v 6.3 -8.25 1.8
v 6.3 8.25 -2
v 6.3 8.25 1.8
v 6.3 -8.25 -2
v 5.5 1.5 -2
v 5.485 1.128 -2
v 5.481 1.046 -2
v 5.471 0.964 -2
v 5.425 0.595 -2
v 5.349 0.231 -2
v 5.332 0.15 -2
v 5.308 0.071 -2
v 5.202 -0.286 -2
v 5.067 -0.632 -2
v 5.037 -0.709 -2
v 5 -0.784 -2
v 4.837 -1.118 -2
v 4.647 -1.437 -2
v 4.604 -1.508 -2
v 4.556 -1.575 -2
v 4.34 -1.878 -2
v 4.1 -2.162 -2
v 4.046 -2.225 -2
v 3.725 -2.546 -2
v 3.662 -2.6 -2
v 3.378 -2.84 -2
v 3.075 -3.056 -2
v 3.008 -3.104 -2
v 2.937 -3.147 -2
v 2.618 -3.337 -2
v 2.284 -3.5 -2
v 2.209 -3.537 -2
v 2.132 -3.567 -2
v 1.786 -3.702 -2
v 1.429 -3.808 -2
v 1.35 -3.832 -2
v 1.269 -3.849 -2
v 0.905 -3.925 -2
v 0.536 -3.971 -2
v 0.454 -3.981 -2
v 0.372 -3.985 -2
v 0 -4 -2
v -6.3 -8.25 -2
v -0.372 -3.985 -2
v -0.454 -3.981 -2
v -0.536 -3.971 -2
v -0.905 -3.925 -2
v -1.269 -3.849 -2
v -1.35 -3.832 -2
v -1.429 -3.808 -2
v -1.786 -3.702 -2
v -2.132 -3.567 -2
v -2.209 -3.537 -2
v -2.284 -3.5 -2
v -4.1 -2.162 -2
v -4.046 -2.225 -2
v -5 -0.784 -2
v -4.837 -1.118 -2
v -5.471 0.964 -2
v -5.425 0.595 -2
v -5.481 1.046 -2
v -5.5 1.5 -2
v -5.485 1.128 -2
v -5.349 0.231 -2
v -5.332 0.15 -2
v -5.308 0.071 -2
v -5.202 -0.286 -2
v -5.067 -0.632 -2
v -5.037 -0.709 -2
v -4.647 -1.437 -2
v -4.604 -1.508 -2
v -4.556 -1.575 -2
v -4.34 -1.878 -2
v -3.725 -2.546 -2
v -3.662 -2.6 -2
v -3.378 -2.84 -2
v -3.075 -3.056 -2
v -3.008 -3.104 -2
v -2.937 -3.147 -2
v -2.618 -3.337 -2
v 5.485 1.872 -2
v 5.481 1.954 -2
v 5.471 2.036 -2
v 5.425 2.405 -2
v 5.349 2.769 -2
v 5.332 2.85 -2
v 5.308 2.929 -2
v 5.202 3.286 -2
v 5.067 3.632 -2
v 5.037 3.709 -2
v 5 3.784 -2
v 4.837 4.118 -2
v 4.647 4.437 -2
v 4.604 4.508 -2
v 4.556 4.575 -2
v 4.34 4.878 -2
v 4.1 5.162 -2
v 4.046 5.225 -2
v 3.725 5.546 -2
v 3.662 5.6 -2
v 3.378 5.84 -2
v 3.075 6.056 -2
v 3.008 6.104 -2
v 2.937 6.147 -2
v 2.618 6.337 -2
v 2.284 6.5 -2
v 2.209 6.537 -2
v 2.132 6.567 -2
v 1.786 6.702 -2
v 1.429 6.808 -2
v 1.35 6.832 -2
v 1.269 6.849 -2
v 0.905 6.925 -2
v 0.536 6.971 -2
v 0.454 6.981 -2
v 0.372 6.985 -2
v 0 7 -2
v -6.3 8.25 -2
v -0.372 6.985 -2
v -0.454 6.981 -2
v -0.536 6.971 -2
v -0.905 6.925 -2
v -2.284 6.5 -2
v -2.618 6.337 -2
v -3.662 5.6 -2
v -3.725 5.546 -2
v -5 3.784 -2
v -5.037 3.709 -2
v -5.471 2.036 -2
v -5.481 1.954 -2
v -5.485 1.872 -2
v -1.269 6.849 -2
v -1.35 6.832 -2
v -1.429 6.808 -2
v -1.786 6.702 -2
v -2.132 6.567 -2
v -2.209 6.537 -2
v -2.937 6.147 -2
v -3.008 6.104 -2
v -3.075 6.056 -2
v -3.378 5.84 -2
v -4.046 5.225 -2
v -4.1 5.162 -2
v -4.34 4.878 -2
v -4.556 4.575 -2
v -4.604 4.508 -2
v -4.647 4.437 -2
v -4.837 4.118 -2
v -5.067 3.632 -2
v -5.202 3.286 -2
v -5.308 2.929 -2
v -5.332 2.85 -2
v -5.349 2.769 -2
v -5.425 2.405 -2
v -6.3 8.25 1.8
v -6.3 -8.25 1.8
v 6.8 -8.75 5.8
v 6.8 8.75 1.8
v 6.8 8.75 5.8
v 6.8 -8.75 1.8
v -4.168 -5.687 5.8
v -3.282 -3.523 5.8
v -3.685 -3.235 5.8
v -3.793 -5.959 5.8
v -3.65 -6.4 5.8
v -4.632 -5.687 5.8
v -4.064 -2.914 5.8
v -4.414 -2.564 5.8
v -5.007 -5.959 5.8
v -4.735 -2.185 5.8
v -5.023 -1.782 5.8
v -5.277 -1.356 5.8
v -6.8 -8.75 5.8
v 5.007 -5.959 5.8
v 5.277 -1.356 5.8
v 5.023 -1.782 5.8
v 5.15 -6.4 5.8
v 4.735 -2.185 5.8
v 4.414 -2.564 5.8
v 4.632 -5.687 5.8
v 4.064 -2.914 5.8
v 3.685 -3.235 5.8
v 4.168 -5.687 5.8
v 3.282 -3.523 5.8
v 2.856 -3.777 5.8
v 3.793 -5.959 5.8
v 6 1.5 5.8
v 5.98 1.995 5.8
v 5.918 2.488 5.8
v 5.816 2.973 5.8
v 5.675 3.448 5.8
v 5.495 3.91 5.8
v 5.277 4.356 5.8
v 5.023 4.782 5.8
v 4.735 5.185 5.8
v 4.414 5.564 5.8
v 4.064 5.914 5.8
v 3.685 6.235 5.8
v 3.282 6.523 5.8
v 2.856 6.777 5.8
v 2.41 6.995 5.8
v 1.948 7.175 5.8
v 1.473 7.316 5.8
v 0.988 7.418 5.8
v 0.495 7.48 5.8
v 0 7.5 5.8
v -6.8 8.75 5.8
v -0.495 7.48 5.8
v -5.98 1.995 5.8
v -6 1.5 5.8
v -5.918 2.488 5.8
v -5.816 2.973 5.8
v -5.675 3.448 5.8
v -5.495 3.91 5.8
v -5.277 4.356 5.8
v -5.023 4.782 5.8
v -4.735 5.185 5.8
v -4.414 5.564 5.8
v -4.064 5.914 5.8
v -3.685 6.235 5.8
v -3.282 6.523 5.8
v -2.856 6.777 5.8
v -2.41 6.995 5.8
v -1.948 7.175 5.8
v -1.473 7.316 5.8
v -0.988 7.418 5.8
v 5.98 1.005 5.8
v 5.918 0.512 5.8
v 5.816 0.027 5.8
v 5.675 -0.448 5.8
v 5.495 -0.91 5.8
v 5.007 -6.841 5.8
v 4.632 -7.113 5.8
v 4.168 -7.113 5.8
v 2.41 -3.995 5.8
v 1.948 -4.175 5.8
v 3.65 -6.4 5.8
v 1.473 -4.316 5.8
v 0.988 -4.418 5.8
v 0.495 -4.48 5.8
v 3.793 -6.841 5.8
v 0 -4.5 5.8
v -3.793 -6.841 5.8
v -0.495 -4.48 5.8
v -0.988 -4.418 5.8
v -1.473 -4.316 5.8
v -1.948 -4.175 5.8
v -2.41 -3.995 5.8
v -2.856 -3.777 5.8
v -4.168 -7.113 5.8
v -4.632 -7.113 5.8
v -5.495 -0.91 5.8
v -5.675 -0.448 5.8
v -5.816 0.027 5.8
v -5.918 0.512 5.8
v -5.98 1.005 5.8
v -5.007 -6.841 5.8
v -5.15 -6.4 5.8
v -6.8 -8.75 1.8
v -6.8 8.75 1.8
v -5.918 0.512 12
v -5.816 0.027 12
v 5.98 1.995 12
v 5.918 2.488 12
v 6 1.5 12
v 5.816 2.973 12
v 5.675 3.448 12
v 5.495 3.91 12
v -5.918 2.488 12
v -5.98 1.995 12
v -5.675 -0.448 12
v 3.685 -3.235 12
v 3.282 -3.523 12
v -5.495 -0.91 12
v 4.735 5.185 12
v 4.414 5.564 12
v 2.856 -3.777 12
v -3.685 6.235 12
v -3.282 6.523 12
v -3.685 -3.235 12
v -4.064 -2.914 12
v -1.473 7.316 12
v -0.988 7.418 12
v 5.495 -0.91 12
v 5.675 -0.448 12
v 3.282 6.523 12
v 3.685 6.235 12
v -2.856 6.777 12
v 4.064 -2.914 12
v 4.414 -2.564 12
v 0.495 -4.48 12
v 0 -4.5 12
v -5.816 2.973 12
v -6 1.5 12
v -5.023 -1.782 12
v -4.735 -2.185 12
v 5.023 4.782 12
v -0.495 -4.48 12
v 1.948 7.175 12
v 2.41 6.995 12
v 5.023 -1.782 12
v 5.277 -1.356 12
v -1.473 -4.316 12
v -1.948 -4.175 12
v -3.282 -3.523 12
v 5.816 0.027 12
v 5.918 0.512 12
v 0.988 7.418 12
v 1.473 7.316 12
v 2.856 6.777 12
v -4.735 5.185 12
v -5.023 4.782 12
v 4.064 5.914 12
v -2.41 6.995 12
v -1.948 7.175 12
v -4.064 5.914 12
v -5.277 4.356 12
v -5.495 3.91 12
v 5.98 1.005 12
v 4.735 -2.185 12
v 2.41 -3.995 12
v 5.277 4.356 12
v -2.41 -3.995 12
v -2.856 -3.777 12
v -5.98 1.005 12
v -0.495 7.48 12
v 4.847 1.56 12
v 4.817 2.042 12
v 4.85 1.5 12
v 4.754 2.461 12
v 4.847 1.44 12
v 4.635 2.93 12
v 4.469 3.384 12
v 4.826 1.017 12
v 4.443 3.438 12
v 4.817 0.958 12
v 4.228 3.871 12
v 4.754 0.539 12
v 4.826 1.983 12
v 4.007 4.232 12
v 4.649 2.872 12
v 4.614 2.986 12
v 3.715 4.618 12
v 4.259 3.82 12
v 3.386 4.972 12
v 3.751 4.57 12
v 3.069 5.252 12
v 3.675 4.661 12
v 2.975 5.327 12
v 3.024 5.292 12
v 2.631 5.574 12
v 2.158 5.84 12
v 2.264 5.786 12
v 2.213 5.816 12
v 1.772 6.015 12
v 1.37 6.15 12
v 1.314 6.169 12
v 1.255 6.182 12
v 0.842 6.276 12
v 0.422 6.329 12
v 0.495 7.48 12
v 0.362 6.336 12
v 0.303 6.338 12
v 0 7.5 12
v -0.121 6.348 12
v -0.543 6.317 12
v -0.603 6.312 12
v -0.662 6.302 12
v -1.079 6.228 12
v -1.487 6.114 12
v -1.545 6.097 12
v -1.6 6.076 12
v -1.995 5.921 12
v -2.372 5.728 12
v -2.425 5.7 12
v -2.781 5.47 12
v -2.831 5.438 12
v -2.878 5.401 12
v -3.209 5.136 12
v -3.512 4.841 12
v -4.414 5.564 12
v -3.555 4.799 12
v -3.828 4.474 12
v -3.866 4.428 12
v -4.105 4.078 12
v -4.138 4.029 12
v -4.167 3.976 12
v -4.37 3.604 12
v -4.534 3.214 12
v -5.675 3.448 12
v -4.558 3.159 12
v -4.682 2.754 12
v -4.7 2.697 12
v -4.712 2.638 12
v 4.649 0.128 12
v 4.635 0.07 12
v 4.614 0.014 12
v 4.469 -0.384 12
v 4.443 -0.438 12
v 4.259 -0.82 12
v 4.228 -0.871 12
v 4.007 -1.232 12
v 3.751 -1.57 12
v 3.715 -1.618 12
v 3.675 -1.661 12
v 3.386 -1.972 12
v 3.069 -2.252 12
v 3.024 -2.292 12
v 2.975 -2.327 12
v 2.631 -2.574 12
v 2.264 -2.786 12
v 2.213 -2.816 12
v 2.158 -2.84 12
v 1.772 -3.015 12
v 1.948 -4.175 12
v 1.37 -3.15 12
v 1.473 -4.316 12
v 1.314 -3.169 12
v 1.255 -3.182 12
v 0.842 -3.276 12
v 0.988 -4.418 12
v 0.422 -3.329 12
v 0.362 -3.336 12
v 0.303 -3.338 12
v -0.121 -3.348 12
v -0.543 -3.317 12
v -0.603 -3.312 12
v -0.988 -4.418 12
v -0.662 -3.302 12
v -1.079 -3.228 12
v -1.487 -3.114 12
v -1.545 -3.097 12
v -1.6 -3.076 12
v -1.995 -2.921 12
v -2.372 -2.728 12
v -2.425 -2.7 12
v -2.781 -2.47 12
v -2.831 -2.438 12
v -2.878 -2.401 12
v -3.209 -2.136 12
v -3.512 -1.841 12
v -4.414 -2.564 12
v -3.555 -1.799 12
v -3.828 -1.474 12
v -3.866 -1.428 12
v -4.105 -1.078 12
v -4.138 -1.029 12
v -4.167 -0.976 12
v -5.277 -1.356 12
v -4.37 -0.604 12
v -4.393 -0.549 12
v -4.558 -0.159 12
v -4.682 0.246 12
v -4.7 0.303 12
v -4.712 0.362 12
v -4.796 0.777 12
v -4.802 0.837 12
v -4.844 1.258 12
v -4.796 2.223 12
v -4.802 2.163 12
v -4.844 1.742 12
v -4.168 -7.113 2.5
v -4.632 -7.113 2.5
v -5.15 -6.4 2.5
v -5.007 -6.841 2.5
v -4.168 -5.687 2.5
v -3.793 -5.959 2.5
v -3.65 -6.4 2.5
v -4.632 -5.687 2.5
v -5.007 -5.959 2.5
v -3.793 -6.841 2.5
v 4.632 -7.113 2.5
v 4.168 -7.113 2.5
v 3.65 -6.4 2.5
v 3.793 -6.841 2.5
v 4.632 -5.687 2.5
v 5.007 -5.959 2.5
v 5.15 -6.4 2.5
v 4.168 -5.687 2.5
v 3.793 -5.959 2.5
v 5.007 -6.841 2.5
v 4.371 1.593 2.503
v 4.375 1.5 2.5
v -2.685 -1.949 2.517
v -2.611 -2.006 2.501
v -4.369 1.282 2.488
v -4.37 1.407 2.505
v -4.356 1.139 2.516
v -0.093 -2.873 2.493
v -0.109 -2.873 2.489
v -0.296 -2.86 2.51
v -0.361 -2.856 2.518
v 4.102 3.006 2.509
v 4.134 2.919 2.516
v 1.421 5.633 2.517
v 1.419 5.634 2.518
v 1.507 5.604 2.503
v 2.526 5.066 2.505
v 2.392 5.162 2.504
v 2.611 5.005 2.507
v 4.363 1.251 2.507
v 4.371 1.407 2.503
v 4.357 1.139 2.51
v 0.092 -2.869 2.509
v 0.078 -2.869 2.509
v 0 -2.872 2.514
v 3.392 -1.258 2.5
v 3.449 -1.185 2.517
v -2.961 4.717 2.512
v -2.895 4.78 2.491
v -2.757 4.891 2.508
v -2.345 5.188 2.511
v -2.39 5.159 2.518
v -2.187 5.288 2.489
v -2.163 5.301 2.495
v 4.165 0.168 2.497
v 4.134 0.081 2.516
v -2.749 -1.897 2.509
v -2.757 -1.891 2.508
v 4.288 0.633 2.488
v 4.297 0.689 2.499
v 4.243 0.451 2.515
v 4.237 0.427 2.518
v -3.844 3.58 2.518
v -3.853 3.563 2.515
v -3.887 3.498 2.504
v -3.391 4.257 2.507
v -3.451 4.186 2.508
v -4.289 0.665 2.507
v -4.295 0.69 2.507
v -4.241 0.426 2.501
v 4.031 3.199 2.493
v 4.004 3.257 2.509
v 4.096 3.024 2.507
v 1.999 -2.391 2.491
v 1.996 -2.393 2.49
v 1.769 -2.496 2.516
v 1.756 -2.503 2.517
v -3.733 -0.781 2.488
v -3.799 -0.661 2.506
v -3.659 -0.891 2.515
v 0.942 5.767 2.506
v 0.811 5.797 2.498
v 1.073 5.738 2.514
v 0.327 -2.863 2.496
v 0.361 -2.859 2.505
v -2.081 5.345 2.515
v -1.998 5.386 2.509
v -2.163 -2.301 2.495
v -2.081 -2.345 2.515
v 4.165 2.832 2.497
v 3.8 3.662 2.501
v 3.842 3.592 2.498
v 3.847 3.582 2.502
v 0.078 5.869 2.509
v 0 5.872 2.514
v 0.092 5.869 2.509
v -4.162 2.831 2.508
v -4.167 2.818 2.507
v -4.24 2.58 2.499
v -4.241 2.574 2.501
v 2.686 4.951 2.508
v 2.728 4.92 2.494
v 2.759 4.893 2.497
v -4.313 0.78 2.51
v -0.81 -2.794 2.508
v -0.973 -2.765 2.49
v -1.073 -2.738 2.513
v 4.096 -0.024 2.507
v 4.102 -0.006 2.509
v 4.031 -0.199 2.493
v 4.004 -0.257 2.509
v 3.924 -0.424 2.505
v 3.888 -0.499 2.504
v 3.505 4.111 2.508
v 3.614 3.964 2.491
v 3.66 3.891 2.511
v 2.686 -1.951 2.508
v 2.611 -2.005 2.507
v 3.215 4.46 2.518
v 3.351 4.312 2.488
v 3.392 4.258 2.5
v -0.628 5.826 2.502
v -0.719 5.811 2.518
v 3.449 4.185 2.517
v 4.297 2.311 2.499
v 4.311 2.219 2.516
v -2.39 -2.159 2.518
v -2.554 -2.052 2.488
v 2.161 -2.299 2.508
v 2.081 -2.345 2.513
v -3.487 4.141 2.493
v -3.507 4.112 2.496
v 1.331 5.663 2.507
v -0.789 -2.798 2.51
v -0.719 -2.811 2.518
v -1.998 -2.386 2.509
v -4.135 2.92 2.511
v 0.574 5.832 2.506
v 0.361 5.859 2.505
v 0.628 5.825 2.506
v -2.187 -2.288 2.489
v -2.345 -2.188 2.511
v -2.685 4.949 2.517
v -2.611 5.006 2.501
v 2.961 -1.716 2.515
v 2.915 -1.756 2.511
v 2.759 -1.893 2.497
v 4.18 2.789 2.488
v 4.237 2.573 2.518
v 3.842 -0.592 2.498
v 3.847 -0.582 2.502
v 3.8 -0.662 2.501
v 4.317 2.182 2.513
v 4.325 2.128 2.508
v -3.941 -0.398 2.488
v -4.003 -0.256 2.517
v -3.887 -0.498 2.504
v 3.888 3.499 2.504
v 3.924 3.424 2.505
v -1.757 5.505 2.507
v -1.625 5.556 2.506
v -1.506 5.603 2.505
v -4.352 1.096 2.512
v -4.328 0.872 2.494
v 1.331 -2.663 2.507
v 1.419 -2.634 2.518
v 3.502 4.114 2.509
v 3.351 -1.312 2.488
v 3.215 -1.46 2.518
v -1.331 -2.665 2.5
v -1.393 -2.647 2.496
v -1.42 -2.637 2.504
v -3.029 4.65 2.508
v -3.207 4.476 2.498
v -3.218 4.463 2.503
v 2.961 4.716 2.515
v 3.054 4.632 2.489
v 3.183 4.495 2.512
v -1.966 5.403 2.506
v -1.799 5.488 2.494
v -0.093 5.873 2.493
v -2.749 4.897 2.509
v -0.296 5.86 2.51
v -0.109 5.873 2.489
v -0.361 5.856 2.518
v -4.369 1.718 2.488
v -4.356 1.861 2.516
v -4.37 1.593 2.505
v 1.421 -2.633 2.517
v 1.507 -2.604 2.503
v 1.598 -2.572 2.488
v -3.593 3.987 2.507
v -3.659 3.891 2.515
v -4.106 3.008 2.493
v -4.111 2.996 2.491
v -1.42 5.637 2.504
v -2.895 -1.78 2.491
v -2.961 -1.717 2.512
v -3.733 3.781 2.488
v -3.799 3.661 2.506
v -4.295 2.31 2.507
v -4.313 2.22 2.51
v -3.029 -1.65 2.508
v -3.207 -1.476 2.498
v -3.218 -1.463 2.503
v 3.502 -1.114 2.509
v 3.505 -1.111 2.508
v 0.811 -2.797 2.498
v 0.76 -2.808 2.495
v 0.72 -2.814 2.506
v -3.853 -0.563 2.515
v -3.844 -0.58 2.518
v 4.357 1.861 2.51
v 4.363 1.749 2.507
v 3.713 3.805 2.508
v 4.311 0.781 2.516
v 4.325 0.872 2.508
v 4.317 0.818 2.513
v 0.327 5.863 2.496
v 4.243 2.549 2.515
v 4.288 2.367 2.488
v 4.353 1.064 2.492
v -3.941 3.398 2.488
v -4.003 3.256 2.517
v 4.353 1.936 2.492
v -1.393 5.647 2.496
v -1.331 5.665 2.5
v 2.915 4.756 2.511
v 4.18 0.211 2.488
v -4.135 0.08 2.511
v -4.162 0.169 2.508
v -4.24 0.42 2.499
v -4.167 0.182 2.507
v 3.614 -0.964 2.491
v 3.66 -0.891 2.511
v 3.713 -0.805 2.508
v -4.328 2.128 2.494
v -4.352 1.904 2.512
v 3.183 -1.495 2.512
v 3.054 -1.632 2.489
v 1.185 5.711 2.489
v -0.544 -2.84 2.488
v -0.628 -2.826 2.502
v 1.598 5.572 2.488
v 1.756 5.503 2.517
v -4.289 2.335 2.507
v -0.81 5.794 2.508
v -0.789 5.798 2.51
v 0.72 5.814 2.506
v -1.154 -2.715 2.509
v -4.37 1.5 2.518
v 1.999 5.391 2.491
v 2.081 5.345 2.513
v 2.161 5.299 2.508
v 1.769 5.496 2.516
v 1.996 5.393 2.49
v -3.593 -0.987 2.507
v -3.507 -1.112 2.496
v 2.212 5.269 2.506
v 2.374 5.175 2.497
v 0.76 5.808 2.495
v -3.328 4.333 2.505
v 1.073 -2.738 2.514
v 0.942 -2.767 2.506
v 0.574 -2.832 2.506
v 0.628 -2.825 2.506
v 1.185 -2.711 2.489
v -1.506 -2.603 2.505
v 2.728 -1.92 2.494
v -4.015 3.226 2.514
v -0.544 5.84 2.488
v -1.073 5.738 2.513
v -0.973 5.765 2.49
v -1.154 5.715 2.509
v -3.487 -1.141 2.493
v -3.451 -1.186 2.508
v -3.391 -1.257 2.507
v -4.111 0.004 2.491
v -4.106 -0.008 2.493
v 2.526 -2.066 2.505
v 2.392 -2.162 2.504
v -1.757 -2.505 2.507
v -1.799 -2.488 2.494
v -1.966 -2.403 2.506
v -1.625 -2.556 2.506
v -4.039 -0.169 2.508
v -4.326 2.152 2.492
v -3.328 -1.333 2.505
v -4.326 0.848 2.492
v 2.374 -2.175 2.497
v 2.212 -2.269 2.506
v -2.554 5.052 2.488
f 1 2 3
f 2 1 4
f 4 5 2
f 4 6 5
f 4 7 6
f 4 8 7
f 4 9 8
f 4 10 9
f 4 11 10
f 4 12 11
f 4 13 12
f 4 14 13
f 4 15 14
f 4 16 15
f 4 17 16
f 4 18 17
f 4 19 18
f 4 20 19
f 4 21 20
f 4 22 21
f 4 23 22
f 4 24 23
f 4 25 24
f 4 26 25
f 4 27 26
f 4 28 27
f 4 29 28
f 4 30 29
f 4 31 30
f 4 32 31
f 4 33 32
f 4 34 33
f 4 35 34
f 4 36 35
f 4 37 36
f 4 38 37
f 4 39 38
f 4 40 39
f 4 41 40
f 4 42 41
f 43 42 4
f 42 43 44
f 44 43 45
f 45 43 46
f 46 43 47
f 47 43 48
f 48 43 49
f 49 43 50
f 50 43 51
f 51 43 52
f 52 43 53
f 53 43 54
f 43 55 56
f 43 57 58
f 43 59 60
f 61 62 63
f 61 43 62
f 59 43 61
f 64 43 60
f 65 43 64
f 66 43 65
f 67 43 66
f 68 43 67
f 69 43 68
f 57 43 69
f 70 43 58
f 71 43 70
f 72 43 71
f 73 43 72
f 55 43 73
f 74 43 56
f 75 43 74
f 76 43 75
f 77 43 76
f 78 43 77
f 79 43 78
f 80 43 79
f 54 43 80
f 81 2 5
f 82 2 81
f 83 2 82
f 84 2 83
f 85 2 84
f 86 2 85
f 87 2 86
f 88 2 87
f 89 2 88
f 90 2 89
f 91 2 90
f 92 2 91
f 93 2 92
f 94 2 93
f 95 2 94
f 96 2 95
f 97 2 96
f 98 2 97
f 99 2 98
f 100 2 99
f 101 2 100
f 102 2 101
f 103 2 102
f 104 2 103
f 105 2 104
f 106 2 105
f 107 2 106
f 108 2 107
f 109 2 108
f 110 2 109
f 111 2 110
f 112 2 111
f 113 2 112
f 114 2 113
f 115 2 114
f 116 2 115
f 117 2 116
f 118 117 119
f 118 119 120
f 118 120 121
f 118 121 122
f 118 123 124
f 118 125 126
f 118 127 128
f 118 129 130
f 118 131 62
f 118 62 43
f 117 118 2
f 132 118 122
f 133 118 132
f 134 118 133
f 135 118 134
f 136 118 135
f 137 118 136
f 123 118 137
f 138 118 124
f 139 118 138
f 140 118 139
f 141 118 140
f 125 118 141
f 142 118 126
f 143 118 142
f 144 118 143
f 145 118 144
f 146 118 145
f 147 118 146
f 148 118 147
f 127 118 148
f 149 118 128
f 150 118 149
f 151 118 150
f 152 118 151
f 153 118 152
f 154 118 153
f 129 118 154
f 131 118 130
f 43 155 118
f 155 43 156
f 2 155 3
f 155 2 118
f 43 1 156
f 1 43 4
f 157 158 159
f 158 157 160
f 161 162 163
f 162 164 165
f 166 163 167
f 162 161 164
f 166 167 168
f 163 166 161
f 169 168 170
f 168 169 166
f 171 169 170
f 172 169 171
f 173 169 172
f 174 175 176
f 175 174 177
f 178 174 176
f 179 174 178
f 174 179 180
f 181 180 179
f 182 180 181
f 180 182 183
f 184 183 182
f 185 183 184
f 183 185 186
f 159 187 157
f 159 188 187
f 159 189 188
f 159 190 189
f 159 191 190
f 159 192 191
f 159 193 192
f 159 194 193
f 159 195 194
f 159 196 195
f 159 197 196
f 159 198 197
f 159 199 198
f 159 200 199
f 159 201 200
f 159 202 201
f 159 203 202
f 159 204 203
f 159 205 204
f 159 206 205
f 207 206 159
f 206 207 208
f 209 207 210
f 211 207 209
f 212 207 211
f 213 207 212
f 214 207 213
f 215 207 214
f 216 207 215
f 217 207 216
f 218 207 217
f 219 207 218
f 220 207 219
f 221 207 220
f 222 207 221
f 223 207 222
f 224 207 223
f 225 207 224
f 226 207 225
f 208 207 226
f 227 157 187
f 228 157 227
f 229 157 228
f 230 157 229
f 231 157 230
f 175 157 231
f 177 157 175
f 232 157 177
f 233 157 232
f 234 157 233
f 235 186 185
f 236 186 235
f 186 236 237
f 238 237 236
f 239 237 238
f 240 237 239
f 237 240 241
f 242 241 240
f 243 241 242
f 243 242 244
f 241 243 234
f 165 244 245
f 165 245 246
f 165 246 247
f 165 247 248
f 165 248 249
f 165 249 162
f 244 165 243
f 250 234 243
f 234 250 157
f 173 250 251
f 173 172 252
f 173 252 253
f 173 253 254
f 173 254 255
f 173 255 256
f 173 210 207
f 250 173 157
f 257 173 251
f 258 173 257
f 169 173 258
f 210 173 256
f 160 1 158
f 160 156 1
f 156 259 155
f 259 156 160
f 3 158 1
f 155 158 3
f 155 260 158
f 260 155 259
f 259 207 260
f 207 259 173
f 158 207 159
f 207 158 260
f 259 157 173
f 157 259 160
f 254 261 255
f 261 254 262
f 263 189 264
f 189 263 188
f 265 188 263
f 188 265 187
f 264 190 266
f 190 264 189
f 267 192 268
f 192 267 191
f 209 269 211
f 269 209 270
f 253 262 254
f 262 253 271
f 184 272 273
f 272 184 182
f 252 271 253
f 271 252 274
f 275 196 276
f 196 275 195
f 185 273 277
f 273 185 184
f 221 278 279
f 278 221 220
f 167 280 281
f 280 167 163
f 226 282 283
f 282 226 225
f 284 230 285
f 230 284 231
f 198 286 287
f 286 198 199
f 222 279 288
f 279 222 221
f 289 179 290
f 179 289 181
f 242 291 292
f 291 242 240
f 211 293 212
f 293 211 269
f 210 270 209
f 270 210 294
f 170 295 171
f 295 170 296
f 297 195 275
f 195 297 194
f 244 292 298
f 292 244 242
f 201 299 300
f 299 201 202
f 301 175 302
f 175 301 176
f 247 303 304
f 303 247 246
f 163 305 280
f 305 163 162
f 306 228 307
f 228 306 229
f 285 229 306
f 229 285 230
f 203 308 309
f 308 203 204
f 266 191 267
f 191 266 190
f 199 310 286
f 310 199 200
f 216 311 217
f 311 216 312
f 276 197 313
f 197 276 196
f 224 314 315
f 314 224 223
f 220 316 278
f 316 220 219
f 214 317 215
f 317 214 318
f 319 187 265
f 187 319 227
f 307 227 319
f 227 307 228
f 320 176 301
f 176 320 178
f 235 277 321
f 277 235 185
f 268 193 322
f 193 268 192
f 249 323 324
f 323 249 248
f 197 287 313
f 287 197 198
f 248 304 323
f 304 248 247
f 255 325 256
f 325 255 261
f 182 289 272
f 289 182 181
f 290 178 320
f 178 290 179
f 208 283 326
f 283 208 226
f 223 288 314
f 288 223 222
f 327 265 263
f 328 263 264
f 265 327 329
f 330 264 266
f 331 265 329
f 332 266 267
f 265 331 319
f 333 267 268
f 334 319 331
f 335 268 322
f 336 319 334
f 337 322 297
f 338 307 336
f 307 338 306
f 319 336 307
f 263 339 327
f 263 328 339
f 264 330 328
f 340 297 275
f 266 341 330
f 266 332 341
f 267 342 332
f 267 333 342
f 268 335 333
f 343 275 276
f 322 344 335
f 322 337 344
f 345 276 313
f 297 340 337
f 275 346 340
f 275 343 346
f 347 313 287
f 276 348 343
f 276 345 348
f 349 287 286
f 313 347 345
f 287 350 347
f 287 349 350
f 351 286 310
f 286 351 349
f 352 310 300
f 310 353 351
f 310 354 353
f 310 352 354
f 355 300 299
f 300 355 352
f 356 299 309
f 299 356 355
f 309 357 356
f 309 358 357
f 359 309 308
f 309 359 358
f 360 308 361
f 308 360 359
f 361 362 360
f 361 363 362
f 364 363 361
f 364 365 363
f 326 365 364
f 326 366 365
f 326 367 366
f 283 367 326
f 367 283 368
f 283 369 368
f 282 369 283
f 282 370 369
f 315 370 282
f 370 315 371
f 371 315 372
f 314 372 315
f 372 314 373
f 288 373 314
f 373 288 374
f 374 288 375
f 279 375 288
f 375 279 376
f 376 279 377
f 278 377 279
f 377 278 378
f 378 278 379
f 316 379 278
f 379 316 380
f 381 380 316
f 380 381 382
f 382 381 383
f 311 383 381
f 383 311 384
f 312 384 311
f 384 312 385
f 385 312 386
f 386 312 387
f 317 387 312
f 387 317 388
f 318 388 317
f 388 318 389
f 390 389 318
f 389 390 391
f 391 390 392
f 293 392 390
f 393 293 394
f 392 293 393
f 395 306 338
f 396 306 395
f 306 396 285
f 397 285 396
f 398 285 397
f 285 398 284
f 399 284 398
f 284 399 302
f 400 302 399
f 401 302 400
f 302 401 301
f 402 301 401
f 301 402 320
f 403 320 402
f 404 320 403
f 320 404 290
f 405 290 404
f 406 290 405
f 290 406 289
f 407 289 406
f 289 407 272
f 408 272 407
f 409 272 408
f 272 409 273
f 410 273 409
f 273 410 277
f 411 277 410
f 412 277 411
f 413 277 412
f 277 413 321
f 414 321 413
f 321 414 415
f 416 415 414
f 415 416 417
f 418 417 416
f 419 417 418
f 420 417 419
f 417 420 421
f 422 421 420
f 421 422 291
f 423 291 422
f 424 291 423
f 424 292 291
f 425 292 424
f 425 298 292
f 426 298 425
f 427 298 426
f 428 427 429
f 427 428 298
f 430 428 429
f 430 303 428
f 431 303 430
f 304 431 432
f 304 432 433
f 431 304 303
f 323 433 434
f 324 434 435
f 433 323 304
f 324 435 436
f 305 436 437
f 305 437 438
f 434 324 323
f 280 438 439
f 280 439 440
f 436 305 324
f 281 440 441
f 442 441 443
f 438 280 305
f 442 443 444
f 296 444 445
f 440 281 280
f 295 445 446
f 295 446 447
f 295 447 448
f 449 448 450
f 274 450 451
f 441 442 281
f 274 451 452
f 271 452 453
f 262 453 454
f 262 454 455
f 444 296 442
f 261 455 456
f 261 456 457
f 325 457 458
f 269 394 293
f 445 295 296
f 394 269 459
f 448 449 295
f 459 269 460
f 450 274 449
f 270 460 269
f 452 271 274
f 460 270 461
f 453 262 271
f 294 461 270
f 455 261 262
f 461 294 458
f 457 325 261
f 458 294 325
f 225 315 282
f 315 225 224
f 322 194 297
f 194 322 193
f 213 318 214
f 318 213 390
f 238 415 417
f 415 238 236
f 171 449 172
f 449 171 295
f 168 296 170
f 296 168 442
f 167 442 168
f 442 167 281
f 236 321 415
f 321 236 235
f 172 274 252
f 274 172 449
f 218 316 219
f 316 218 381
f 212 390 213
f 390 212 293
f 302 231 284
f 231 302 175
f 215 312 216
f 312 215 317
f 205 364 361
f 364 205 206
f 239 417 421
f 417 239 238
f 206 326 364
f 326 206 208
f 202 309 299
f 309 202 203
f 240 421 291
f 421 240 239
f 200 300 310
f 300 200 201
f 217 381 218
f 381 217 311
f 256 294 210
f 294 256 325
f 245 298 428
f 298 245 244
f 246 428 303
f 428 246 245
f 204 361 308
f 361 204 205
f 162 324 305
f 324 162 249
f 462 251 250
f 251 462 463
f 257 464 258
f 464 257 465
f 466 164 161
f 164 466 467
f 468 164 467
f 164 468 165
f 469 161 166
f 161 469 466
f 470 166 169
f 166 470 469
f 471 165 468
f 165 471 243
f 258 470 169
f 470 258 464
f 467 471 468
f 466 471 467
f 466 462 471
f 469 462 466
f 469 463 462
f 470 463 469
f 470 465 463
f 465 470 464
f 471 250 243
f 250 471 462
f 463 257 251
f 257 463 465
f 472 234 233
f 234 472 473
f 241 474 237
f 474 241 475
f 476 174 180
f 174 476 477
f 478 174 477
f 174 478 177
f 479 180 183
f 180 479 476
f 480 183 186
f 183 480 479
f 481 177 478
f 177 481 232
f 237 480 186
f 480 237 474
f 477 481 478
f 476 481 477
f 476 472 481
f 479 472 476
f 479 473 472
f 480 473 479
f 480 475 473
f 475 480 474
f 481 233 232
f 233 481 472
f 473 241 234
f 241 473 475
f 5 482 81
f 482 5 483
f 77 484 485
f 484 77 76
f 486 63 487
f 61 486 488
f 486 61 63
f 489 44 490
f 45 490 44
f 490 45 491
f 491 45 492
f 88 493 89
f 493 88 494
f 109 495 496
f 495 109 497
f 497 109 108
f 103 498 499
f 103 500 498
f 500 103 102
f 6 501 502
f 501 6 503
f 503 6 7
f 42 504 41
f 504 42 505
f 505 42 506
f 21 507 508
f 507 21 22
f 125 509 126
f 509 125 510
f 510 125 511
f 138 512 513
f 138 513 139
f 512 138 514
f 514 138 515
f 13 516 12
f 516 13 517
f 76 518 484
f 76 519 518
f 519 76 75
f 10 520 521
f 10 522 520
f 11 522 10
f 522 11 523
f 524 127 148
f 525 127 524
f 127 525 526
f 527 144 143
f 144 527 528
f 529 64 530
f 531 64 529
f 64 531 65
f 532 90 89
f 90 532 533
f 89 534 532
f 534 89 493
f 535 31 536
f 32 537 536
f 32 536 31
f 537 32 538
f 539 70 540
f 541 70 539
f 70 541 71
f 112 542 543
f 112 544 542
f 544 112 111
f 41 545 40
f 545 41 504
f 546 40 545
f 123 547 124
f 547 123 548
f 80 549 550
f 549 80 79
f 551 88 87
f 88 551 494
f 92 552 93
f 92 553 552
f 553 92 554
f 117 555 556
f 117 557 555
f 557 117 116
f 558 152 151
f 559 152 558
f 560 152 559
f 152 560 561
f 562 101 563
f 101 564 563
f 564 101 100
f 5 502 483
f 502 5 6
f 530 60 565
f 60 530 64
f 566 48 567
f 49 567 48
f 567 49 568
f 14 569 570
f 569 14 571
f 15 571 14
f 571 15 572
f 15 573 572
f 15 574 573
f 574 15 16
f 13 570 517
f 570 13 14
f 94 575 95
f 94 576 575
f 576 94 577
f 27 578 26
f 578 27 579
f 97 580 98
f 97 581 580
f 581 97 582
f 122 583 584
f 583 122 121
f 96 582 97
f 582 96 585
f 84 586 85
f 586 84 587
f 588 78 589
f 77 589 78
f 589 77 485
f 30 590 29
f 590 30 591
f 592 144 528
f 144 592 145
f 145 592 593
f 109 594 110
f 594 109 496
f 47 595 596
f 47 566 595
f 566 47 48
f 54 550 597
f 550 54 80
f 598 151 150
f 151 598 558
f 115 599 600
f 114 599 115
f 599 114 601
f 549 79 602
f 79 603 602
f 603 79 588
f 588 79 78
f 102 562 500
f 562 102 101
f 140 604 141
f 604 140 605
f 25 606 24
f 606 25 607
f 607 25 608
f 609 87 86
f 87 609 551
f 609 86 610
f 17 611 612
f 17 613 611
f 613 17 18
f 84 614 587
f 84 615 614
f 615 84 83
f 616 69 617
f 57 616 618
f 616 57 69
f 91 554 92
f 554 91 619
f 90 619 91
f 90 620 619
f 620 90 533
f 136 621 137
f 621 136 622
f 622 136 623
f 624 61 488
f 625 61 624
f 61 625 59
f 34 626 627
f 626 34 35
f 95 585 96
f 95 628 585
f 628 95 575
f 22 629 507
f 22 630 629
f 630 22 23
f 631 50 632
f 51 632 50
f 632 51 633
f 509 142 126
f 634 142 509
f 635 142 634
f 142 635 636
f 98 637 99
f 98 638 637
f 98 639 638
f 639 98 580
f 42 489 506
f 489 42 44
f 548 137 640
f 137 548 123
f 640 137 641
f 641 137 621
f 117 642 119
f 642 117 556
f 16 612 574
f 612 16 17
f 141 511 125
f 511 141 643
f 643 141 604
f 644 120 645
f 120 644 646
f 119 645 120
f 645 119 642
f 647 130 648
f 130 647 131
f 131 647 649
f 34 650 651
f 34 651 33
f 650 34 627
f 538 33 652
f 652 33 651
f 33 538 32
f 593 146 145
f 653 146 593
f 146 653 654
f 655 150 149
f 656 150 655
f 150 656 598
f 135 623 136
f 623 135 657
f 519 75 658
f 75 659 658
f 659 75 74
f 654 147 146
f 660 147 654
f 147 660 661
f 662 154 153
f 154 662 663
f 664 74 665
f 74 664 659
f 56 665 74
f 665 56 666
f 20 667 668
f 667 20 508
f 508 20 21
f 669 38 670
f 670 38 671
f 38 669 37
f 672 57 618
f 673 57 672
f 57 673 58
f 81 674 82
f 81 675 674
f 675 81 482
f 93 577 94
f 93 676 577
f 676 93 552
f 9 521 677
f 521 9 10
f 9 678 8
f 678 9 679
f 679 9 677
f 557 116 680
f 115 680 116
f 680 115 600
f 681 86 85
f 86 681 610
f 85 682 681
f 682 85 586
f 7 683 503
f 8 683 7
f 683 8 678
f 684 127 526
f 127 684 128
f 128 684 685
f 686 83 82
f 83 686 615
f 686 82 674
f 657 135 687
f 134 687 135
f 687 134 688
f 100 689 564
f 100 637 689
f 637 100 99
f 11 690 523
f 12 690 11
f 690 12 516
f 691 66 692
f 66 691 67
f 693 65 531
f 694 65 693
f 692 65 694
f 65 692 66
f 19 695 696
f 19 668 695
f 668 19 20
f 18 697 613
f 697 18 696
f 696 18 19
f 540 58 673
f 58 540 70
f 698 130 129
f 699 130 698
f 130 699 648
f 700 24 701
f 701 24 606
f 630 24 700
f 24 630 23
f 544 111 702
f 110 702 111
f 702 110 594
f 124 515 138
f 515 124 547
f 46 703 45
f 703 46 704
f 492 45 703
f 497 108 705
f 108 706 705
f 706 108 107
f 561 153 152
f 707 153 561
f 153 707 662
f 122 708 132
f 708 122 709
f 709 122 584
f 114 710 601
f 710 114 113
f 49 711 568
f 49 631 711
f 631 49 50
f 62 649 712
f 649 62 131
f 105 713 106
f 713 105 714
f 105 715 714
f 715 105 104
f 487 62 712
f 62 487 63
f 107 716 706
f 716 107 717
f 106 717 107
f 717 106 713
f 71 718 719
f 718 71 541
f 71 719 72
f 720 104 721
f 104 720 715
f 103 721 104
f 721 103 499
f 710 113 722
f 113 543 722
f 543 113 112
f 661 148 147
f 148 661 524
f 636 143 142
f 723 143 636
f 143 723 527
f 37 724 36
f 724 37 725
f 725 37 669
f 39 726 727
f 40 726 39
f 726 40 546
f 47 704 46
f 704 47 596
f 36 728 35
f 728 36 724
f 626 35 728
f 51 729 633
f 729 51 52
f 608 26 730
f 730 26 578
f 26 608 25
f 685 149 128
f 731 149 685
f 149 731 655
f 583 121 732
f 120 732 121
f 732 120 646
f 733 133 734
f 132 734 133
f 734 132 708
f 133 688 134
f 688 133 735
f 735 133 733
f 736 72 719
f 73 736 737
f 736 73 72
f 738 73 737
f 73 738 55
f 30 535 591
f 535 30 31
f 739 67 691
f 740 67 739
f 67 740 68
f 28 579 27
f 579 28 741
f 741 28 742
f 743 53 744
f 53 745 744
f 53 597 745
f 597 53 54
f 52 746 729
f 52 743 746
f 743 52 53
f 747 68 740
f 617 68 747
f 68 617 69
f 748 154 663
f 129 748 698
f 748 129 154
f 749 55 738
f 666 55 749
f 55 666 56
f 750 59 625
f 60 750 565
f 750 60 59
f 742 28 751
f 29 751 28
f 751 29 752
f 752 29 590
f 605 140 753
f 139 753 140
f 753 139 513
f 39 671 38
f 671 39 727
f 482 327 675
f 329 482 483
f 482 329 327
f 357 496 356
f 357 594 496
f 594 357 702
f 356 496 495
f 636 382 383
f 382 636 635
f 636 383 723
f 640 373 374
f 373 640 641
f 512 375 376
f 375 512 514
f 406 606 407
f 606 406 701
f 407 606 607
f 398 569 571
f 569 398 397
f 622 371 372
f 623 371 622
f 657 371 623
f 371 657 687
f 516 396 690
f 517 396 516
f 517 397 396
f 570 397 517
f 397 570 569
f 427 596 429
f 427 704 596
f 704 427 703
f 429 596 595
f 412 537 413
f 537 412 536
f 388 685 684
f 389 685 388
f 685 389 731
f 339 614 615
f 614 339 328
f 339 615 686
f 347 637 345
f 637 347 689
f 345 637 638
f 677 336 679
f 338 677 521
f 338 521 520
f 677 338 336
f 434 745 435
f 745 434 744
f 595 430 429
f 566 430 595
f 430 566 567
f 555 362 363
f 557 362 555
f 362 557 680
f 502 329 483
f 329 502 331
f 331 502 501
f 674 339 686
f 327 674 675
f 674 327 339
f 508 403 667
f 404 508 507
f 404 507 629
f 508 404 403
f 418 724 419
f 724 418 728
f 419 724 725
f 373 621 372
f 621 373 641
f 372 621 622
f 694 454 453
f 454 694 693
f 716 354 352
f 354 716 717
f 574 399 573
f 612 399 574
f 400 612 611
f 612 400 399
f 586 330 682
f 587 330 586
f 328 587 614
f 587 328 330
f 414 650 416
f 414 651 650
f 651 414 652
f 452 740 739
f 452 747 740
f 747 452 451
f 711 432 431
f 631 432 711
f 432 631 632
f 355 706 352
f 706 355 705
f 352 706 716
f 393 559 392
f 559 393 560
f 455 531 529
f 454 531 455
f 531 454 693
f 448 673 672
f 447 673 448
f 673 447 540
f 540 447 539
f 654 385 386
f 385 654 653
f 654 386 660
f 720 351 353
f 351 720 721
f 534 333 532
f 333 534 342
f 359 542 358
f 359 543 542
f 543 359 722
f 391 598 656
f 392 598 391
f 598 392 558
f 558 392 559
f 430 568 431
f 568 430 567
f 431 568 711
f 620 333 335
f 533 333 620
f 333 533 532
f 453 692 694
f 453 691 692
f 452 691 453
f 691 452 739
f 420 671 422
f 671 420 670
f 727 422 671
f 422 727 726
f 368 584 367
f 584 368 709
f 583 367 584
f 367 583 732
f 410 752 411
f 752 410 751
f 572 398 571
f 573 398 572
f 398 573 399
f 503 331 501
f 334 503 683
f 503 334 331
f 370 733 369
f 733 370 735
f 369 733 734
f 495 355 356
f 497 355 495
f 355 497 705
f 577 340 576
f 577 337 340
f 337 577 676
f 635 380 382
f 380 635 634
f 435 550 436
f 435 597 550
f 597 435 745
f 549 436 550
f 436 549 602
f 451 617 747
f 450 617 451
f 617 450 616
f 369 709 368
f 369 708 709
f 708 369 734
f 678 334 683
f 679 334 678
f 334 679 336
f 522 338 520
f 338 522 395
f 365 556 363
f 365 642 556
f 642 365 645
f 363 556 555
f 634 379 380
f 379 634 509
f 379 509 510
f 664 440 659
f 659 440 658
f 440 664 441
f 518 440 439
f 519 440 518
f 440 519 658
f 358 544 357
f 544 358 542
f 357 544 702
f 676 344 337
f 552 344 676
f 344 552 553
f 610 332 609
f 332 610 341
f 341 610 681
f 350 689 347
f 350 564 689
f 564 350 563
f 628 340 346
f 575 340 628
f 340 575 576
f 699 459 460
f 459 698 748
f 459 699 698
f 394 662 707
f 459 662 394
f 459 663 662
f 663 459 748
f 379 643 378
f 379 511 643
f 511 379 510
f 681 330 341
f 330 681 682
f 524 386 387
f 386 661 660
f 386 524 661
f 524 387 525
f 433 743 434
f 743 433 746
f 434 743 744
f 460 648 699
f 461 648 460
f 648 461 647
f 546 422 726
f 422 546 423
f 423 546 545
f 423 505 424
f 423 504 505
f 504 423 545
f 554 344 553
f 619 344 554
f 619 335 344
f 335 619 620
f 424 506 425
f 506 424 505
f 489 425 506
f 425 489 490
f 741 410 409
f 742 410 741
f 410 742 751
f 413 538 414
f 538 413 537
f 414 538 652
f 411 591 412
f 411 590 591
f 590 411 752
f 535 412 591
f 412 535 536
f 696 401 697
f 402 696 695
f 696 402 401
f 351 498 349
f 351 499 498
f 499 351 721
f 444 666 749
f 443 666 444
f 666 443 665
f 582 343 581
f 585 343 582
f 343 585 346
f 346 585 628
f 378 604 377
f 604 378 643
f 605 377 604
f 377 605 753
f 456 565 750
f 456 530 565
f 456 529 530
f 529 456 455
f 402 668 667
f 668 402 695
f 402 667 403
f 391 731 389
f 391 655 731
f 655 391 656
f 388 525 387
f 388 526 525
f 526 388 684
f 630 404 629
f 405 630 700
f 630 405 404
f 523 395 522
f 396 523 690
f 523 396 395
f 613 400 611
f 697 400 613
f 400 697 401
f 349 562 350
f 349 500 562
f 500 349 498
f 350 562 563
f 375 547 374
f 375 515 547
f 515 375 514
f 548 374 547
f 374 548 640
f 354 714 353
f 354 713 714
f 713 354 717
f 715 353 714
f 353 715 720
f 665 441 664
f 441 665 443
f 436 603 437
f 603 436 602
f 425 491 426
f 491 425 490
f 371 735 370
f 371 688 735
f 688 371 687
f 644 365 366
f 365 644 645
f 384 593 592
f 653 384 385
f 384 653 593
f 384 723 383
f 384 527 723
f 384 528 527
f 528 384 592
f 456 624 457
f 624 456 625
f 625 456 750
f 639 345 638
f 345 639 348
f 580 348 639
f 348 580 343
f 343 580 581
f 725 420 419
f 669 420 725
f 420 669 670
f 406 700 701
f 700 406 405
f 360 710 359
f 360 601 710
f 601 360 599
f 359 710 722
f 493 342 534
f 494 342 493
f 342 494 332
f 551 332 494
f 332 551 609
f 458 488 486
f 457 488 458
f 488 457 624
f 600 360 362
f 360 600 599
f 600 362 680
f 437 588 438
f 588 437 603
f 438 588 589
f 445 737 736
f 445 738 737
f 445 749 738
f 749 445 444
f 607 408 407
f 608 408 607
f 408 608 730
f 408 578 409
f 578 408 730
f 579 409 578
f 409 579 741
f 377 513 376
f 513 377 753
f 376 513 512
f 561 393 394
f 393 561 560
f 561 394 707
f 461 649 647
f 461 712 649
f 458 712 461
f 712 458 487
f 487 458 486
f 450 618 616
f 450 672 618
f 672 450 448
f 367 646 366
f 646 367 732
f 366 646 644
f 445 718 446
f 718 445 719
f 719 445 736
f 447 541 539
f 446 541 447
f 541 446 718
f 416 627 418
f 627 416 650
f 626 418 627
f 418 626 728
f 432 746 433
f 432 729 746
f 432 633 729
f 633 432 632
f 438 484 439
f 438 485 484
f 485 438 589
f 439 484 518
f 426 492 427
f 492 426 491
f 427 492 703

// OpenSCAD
$fa=0.5; // default minimum facet angle is now 0.5
$fs=0.5; // default minimum facet size is now 0.5 mm

outer_diameter=10;

difference() {
    offset = 1.5;
    union() {
        cube([12.6,16.5,4], center=true);
        translate([0,0,3.8]) cube([12.6+1,16.5+1,4], center=true);
        translate([0,offset,8]) cylinder(d=outer_diameter+2, h=8, center=true);
    }
    translate([0,offset,0]) cylinder(d1=12, d2=outer_diameter-2, h=8, center=true);
    translate([0,offset,5]) cylinder(d1=outer_diameter-2, d2=outer_diameter, h=20, center=true);
    for(i=[-1,1]) translate([i*4.4,-6.4,5]) cylinder(d=1.5, h=5, center=true);
}

* union(){
    difference(){
        union() {
            hull() {
                cylinder(5, d=11.5+2.4, center=true);
                for(i=[-1,1]) translate([i*4.5,-8,0]) cylinder(5,d=2+2.4,center=true);
            }
            translate([0,0,5]) cylinder(d=outer_diameter+2, h=8, center=true);
        }

        for(i=[-1,1]) translate([i*3.5,-8,2]) cylinder(5+1,d=1.5,center=true);
        translate([0,0,3]) cylinder(d1=outer_diameter-2, d2=outer_diameter, h=20, center=true);
        cylinder(d1=12, d2=outer_diameter-2, h=8, center=true);
    }
}
